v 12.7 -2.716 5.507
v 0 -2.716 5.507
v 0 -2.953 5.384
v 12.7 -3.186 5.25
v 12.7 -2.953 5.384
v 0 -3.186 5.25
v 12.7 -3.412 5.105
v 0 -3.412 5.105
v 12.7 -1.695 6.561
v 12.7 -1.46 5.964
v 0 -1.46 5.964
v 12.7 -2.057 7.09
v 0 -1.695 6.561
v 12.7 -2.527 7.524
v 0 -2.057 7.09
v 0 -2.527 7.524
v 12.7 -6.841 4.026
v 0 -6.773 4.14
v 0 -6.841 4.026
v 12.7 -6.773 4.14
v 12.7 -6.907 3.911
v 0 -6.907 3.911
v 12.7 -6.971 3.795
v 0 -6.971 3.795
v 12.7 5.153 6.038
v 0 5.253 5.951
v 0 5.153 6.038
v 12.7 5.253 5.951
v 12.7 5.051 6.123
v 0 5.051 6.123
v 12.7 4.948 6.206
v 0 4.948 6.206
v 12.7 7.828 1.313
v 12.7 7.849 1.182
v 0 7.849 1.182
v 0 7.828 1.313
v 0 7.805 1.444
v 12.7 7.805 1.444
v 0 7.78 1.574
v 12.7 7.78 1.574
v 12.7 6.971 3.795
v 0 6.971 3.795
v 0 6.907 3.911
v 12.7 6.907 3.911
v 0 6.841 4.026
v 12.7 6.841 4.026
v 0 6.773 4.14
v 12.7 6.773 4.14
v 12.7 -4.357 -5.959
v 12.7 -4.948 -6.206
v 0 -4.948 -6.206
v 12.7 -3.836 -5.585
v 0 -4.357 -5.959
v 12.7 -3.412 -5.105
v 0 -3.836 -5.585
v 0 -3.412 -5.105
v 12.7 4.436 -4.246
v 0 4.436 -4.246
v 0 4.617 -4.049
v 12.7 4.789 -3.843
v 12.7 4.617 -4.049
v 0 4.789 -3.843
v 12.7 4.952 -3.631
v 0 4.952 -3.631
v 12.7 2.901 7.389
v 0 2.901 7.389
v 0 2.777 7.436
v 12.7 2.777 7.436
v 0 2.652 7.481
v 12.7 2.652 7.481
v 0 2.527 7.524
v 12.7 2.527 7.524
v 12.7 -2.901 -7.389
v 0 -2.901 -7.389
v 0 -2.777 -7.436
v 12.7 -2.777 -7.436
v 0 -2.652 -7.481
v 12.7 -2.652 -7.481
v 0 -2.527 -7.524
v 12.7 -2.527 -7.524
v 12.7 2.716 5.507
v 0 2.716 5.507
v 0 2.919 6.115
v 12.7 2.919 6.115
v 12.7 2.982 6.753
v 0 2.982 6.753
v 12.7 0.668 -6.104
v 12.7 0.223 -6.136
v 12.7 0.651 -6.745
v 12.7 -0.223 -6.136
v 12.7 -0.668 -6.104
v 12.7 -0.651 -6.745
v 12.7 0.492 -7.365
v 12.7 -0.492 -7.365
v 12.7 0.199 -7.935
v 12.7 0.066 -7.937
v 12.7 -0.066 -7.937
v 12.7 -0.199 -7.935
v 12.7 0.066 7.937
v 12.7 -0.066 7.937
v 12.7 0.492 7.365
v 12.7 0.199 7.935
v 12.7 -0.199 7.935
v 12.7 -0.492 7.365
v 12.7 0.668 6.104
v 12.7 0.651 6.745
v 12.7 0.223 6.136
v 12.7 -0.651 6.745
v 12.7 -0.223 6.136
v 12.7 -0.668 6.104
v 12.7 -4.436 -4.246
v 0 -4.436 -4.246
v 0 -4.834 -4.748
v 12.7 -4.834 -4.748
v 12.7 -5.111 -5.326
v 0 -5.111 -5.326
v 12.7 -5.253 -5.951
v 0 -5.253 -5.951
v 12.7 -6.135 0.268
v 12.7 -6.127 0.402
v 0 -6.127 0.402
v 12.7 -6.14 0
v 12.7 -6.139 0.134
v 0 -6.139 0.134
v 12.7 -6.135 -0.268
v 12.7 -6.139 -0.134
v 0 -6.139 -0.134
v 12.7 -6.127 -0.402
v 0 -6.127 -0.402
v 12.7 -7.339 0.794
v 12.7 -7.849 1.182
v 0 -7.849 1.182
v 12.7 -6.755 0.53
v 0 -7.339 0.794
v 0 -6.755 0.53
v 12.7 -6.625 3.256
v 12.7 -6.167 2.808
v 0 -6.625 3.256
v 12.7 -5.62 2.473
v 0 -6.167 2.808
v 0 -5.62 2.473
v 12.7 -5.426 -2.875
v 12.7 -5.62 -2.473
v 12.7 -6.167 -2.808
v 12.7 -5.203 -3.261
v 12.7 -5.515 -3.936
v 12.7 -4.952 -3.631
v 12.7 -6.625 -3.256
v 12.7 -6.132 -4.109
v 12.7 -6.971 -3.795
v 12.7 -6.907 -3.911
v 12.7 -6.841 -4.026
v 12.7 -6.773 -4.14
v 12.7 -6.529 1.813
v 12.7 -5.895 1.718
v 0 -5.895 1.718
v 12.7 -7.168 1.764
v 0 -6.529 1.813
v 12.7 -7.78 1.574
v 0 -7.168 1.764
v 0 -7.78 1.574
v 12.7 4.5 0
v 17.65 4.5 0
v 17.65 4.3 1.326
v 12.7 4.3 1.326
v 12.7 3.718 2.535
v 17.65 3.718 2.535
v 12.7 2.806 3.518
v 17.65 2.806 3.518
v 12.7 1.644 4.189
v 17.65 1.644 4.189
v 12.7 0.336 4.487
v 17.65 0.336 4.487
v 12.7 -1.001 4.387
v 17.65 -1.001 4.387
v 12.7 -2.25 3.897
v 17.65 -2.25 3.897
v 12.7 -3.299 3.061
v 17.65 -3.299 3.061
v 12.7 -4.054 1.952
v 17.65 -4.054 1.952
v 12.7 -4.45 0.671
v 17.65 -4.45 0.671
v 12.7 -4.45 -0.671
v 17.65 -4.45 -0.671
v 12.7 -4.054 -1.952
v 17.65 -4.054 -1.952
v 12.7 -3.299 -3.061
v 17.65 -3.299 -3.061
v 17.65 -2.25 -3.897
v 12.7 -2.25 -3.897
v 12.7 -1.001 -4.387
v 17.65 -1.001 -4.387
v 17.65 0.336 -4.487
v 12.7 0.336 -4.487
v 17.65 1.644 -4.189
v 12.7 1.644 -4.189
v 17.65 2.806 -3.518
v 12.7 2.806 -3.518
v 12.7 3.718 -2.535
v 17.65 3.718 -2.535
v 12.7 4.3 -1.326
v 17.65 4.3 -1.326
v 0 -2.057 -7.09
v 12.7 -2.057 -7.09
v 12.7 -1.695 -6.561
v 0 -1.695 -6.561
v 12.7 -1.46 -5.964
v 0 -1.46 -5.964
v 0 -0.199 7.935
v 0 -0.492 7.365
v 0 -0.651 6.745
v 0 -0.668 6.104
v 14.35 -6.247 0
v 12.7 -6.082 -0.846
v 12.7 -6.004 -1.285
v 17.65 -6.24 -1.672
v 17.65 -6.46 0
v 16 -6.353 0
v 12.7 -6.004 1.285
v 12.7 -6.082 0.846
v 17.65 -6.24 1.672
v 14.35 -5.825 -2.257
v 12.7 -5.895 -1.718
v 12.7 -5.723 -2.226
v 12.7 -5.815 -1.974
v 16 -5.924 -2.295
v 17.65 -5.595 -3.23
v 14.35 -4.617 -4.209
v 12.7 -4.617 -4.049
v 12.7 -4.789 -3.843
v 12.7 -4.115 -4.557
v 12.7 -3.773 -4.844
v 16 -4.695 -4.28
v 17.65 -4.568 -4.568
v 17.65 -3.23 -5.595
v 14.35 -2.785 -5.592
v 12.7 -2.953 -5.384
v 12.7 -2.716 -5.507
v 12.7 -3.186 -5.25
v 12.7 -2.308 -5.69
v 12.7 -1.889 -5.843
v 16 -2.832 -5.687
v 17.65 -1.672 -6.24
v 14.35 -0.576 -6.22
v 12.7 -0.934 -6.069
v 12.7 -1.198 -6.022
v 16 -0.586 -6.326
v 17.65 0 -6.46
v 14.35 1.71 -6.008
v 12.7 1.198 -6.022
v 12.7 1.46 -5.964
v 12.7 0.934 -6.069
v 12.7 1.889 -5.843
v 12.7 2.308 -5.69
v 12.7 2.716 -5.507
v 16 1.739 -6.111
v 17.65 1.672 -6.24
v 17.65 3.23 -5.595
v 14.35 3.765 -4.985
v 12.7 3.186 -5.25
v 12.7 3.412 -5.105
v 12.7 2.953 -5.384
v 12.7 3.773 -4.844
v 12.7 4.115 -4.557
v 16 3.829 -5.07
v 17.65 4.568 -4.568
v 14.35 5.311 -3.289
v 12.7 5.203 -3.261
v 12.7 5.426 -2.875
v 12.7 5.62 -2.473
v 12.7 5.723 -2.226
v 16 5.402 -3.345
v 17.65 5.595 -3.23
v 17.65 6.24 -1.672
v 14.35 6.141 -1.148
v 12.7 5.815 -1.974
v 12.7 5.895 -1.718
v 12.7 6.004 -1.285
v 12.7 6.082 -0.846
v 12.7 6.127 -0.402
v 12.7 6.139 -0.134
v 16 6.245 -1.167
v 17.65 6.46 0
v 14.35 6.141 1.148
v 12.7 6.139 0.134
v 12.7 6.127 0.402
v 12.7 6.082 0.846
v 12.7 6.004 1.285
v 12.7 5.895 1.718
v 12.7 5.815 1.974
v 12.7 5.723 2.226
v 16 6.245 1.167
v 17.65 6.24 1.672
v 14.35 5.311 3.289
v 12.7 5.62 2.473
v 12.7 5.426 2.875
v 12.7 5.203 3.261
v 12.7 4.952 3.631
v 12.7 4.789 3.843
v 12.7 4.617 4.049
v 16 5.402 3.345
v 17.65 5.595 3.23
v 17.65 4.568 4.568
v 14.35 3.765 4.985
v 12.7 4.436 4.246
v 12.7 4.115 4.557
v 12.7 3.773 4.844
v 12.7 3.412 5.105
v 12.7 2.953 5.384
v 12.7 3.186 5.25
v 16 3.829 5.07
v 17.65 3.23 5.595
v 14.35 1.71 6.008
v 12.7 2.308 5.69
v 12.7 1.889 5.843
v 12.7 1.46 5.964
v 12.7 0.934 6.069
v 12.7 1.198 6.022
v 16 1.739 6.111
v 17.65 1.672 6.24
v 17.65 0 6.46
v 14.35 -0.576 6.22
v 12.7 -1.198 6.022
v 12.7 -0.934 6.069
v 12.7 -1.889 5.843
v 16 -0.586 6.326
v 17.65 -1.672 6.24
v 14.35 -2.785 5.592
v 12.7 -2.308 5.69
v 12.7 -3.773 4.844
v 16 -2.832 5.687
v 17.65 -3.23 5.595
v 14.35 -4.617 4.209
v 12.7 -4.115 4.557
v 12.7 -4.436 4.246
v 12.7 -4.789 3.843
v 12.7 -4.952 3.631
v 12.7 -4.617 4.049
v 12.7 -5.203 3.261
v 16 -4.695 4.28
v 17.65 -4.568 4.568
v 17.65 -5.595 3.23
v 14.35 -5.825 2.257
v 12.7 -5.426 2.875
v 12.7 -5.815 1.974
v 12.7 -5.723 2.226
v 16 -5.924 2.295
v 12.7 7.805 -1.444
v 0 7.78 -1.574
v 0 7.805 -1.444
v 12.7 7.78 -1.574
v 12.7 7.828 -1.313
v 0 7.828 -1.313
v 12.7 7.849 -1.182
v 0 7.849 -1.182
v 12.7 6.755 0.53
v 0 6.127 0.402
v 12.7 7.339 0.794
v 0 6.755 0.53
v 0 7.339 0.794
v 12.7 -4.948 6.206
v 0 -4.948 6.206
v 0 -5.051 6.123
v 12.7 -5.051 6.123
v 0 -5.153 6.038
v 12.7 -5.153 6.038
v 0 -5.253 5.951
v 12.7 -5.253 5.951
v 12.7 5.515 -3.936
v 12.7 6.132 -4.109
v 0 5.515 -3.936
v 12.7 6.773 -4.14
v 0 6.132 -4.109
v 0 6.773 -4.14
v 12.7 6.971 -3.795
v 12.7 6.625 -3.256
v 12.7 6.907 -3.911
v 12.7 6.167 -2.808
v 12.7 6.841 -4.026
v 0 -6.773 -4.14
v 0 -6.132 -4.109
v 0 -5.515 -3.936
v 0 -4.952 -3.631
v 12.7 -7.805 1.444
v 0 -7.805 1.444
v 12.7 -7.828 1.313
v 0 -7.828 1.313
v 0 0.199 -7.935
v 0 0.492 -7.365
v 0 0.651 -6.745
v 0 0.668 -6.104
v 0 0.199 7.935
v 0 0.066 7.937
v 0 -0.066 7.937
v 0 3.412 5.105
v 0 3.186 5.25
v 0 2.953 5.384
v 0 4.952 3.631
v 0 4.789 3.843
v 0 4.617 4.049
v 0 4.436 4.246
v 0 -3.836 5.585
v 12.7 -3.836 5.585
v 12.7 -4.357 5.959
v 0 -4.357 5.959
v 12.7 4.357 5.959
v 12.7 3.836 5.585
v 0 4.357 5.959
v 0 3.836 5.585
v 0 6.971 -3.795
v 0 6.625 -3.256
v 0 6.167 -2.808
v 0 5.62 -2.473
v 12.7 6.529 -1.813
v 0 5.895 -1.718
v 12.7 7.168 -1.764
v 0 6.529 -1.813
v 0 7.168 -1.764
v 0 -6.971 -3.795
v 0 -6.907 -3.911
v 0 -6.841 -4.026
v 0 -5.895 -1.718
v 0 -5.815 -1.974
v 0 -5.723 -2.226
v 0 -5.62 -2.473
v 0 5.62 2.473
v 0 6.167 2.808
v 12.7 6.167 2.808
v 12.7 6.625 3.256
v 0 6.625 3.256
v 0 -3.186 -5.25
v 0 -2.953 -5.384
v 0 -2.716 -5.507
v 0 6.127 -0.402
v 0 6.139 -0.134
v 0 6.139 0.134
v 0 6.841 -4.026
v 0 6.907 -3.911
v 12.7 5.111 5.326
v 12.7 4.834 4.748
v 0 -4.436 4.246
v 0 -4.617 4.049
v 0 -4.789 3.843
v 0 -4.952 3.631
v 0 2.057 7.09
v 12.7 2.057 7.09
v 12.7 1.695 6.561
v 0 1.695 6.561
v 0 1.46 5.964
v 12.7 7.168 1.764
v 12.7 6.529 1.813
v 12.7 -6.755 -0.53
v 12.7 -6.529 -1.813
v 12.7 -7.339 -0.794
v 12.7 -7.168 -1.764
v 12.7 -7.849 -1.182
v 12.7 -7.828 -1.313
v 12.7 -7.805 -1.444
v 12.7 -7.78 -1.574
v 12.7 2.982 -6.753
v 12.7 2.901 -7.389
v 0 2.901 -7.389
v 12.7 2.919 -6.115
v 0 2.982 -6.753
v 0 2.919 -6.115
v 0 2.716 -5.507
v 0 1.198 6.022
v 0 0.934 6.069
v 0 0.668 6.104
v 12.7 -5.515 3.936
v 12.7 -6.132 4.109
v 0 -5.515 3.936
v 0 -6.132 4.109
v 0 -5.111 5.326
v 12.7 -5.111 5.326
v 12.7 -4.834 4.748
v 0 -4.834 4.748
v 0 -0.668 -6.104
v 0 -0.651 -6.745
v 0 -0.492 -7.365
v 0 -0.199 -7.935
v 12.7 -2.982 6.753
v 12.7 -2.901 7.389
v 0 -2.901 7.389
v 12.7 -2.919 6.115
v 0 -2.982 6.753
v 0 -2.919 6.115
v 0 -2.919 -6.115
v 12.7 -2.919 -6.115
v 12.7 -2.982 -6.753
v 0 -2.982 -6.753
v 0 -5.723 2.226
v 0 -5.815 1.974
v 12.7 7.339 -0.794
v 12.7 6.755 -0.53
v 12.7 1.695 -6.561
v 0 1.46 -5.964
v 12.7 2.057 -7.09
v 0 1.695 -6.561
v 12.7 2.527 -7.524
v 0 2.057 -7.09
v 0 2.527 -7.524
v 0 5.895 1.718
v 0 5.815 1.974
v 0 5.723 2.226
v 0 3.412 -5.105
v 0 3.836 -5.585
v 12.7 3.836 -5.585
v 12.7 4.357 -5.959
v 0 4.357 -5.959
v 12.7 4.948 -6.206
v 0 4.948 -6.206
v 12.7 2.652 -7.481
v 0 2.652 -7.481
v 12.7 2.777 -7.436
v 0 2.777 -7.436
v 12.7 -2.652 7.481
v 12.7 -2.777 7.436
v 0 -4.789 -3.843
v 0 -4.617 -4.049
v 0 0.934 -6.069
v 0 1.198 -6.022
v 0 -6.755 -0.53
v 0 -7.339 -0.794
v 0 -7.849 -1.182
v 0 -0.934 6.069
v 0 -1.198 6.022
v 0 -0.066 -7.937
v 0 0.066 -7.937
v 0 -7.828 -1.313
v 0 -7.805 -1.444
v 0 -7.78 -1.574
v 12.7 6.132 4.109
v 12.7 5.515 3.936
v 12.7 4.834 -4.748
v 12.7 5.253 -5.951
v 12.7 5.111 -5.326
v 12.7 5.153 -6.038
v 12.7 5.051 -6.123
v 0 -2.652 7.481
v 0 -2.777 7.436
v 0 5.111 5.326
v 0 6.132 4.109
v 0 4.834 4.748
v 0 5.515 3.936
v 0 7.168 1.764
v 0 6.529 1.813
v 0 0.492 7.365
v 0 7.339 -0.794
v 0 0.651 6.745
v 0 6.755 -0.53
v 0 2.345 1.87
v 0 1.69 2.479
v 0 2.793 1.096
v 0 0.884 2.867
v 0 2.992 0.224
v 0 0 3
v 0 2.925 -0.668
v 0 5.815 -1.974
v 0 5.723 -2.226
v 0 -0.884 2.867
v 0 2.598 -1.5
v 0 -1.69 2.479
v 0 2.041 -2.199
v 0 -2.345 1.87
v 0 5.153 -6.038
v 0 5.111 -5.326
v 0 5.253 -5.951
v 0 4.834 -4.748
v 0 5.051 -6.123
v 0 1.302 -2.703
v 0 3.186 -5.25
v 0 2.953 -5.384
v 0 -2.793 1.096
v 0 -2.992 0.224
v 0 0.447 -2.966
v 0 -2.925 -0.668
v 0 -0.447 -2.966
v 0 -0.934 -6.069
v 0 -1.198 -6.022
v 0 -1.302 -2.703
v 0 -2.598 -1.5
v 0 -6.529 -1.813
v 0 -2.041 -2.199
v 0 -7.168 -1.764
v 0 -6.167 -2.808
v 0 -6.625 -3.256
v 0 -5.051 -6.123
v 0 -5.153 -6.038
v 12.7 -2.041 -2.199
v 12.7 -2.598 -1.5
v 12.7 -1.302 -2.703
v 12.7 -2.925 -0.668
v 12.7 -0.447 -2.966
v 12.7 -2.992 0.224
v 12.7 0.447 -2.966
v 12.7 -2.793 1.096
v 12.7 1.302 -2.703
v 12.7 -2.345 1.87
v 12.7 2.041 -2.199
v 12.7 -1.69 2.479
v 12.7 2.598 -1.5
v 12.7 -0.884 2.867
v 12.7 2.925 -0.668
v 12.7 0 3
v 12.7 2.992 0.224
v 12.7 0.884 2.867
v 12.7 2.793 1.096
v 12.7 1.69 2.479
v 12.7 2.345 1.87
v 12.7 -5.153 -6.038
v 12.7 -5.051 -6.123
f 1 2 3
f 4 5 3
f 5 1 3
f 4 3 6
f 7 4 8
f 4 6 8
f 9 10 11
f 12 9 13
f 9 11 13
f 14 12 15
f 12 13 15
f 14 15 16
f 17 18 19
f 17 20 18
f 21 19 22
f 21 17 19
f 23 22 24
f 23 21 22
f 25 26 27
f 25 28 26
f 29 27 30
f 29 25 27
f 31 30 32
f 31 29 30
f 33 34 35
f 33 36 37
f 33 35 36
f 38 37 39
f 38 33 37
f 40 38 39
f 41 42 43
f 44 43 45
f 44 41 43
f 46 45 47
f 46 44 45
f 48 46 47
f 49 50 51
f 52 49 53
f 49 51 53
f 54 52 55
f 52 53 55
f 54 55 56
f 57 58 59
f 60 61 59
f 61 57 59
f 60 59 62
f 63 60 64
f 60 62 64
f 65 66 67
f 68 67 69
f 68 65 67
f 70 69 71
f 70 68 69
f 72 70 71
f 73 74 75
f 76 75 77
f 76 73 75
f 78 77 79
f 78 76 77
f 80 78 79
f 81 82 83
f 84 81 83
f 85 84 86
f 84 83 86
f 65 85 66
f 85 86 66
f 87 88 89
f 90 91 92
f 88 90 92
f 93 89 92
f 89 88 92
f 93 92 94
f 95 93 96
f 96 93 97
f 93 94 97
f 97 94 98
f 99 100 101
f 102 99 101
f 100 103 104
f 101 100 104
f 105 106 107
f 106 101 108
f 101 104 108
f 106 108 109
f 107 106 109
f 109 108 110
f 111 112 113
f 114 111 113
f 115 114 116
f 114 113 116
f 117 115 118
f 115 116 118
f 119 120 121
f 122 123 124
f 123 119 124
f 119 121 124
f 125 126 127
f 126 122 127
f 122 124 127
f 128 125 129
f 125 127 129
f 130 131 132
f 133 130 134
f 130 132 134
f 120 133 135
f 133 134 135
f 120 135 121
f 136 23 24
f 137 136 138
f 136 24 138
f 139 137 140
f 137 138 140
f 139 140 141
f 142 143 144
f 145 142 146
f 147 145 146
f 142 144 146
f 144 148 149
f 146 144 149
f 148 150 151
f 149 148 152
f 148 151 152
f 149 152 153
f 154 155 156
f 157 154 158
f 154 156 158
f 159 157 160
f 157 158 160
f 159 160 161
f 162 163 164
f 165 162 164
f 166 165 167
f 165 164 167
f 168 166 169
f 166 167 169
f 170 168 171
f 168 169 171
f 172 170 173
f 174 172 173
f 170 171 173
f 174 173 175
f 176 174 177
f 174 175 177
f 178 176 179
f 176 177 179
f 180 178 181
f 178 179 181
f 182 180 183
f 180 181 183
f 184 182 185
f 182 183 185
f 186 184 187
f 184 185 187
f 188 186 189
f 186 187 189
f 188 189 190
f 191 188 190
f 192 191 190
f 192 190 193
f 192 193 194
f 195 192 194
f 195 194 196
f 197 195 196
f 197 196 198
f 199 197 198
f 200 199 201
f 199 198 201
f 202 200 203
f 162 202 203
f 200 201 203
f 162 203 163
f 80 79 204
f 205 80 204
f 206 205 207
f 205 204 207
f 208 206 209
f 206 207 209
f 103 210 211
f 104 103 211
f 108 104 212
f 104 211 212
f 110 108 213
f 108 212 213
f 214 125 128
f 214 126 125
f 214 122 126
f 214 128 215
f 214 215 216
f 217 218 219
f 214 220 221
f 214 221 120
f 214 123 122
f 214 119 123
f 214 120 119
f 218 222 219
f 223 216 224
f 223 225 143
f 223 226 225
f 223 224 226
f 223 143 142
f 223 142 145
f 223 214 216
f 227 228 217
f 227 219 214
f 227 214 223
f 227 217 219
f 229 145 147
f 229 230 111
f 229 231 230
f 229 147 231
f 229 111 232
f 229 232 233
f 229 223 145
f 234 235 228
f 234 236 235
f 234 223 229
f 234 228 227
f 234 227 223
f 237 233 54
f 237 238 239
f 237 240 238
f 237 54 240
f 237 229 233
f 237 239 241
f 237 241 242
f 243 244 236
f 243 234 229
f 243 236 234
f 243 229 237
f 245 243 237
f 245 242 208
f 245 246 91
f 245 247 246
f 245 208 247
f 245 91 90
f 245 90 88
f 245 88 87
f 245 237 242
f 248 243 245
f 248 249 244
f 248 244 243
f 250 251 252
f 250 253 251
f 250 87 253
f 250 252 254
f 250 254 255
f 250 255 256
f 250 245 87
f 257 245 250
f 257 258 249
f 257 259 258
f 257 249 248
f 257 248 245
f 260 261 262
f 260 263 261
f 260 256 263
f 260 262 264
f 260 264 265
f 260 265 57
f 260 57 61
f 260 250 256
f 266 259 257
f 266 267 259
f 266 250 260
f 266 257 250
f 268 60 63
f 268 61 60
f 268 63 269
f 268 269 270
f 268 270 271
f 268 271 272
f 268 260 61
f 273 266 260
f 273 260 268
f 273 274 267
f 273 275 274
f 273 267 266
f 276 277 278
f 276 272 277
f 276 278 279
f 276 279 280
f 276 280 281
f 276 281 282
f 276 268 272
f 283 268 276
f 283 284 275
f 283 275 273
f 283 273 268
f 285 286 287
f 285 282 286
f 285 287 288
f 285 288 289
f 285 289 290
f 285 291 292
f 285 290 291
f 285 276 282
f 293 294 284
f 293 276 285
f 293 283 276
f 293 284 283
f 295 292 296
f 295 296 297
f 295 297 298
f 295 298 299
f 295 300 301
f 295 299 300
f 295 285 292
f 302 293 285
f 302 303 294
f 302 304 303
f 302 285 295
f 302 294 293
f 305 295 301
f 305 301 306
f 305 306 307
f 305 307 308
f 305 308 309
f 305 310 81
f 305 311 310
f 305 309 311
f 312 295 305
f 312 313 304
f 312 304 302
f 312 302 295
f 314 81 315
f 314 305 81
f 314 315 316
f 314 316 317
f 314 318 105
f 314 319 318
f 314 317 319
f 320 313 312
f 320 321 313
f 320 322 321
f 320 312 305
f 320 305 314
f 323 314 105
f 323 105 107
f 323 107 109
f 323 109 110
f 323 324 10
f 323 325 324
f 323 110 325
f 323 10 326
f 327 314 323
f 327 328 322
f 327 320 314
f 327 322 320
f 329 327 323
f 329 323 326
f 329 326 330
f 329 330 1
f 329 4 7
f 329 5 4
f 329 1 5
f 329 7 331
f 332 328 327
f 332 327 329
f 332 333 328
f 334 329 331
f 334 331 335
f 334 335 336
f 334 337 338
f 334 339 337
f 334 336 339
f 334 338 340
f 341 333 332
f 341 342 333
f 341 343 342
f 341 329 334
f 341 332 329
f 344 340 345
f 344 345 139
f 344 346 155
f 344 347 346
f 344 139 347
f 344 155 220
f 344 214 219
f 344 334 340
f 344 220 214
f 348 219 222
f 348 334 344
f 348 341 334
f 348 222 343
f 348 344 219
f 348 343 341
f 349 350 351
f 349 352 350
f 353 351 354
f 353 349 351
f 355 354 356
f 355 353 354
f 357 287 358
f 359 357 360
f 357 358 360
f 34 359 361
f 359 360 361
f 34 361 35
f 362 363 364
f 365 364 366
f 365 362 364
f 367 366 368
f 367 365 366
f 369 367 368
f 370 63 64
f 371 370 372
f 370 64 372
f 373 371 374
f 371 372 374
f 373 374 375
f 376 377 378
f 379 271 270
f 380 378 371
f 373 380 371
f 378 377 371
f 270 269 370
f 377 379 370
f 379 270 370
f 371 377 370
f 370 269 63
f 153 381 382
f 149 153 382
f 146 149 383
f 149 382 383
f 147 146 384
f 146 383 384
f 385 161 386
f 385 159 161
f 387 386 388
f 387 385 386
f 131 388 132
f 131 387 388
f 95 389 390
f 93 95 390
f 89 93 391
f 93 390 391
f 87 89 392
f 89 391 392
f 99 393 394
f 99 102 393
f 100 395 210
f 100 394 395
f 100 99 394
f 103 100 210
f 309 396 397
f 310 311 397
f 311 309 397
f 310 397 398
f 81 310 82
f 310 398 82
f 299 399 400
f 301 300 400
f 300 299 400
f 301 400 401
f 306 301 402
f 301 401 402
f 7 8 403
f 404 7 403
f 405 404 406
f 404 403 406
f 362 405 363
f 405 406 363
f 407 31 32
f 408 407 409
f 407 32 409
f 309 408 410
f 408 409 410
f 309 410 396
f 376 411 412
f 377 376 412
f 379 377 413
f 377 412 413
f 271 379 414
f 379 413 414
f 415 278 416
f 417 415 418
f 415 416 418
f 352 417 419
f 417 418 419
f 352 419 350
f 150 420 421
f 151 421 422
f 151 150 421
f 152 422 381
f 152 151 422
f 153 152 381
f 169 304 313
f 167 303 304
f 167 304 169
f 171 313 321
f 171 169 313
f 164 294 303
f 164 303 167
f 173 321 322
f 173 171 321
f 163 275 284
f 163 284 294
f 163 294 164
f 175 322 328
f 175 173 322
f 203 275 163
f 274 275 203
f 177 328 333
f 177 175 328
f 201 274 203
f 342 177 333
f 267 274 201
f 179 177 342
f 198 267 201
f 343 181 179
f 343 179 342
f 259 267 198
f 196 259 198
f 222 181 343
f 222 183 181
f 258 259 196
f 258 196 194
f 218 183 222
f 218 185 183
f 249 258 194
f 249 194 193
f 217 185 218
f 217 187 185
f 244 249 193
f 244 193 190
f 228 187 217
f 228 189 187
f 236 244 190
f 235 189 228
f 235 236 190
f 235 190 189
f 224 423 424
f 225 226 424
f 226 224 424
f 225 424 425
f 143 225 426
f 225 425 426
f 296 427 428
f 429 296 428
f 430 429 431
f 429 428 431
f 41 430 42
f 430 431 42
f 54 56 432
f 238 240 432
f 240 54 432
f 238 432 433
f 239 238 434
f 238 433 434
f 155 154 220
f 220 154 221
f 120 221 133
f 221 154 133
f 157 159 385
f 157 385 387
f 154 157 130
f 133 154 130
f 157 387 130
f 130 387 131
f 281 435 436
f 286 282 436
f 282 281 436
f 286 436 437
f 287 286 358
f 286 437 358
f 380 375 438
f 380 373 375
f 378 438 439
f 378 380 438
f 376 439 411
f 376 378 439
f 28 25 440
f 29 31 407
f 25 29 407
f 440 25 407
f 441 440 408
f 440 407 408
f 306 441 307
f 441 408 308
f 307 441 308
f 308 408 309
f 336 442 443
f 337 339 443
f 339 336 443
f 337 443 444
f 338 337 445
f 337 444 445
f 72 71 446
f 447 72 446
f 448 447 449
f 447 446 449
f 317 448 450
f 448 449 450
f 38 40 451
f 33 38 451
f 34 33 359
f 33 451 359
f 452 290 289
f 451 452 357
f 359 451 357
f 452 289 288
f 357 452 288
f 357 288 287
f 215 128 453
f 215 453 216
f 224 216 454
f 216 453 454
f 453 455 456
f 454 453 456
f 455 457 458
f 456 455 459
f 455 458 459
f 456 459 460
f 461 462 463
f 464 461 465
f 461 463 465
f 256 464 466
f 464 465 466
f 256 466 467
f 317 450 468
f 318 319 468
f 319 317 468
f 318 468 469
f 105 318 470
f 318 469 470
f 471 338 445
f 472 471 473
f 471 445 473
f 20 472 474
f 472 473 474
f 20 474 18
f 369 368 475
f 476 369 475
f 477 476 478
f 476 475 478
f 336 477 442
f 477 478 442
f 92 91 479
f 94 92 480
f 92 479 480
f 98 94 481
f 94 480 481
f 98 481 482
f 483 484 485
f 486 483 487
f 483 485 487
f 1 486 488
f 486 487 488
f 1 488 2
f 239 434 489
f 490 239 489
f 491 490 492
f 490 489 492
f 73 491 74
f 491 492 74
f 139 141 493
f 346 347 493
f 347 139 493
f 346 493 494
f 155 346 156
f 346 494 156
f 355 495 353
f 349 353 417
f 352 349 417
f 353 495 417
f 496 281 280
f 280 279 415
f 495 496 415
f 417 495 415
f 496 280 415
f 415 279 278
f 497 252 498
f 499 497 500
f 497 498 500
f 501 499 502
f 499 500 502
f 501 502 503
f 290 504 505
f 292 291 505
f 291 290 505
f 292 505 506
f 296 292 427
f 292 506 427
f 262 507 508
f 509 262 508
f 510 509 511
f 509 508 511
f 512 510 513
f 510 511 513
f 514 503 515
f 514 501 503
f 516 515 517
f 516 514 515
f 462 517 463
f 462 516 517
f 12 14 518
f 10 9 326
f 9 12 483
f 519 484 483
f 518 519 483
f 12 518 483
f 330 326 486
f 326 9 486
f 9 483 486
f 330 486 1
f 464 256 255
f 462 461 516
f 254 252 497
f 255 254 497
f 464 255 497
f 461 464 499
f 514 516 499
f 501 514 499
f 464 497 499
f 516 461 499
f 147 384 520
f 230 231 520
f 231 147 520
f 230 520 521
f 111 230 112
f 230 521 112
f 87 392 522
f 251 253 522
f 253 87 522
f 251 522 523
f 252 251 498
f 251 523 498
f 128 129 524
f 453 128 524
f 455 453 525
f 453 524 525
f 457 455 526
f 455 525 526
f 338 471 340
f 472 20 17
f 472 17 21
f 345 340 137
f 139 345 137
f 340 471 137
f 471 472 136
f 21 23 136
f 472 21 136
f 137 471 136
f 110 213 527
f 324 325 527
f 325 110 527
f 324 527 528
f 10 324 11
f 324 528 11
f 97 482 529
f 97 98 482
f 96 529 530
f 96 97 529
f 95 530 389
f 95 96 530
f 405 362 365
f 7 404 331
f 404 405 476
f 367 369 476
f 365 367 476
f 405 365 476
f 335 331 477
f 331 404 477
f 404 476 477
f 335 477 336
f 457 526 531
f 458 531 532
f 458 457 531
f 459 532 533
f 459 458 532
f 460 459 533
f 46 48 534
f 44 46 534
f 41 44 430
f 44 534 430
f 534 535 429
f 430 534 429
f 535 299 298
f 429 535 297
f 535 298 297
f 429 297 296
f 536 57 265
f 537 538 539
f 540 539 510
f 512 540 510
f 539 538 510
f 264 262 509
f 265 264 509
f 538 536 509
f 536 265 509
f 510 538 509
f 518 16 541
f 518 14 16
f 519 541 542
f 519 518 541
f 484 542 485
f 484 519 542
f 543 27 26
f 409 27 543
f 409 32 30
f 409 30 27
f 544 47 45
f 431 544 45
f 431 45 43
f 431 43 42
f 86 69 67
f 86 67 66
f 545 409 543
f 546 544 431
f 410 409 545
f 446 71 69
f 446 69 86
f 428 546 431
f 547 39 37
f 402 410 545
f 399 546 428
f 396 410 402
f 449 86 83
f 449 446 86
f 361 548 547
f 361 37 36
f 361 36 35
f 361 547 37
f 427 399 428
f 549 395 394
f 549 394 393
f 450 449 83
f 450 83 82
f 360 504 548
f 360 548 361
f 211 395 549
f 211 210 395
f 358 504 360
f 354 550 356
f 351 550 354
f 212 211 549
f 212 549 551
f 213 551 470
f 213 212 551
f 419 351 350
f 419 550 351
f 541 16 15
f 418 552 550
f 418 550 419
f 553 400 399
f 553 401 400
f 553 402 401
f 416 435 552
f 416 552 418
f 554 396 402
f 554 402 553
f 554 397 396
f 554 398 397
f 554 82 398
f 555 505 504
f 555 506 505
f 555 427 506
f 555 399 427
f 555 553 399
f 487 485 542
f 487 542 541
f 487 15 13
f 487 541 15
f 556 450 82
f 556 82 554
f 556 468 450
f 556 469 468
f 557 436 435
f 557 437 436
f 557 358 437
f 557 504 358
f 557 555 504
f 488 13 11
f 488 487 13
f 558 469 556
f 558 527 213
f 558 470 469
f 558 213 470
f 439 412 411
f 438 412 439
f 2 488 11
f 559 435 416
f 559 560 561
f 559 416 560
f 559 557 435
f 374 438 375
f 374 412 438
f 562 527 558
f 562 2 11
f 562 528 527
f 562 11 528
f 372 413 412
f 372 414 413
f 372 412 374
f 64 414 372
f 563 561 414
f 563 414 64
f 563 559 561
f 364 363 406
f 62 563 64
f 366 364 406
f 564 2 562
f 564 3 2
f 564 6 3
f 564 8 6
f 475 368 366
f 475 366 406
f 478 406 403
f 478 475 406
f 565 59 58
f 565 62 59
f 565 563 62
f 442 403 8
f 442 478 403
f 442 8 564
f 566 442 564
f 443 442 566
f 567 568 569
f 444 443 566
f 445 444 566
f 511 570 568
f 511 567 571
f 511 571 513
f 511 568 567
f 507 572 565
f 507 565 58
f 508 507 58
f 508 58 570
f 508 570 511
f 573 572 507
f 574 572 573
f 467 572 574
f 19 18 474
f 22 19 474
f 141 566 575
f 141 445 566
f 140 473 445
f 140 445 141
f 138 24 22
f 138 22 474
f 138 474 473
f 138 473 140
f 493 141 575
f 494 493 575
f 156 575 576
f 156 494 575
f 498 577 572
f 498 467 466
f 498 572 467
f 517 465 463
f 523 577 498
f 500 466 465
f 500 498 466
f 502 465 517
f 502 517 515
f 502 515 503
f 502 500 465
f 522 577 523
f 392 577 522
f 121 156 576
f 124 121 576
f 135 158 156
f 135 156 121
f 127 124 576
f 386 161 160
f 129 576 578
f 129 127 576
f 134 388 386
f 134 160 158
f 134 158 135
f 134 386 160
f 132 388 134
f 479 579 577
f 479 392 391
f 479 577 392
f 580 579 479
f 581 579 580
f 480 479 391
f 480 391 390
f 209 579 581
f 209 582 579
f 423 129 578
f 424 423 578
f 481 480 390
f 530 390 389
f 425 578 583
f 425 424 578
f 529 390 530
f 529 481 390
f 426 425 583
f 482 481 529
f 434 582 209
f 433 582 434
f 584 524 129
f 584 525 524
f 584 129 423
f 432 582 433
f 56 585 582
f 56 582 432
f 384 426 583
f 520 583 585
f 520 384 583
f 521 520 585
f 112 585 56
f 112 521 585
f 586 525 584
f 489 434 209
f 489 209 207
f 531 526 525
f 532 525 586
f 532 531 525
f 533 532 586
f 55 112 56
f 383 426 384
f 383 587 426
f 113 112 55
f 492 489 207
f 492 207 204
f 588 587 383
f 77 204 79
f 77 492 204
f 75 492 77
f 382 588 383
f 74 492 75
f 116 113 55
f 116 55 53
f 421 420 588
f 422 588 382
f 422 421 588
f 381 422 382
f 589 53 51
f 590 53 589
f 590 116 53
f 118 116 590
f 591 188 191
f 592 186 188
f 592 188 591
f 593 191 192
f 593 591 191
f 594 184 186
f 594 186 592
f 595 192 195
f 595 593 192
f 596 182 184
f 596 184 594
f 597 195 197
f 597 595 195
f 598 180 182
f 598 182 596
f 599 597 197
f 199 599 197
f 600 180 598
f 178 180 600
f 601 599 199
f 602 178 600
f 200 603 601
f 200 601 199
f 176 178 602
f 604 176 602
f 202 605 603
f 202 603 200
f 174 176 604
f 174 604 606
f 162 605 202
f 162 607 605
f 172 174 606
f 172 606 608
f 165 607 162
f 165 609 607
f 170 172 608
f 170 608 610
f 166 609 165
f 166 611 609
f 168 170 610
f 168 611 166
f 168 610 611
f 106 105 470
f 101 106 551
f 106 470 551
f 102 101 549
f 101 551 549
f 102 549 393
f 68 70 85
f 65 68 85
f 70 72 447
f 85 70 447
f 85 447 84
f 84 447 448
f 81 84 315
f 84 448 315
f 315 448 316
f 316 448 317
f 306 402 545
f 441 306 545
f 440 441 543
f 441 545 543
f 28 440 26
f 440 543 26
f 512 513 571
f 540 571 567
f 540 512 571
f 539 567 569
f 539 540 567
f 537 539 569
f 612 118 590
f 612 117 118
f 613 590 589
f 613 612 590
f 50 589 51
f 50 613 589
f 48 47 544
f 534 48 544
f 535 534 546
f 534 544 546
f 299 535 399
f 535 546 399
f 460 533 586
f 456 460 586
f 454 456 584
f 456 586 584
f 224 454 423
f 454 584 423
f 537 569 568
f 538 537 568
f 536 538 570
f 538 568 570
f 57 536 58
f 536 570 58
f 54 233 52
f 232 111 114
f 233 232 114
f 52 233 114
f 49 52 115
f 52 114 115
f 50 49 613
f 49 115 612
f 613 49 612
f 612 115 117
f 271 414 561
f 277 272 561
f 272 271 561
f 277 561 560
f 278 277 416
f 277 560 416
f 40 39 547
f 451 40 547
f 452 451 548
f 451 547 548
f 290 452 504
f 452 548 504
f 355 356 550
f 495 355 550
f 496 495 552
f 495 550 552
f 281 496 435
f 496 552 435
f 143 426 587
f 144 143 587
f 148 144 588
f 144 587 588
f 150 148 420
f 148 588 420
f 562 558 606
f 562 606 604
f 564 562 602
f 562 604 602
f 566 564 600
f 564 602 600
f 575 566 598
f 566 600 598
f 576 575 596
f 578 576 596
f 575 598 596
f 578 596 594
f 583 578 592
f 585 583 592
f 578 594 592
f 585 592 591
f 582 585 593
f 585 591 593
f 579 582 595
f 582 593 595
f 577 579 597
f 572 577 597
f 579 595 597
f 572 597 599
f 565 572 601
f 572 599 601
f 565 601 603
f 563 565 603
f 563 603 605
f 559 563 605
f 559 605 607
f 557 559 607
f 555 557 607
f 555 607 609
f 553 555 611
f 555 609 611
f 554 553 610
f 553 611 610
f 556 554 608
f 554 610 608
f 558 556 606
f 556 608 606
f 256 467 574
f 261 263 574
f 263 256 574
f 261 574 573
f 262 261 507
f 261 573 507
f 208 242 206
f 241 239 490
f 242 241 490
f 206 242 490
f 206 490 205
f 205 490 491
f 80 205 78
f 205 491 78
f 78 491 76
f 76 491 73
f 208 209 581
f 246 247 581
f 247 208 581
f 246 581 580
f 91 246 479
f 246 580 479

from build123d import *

# Parameters (mm, degrees)
BASPROSKE_W        = 12.7
BASPROSKE_H        = 7.9375
TOOTHCUT_DEPTH     = 17.949861725
TEETHCUTS_COUNT    = 18
TEETHCUTS_ANGLE    = 340
BORSKE_R           = 3
BORE_DEPTH         = 50.8000508
SKETCH2_R          = 4.5
CUT_EXTRUDE1_DEPTH = 4.95


with BuildPart() as part:
    # BasProSke → Base-Revolve (revolve)
    with BuildSketch(Plane(origin=(0, 0, 0), x_dir=(1, 0, 0), z_dir=(0, 1, 0)), mode=Mode.PRIVATE) as base_revolve_sk:
        with Locations((6.35, 3.96875)):
            Rectangle(BASPROSKE_W, BASPROSKE_H)
    revolve(base_revolve_sk.sketch.rotate(Axis((-10, 0, 0), (1, 0, 0)), 180), axis=Axis((-10, 0, 0), (1, 0, 0)))

    # TooCutSke → ToothCut (cut, through all)
    with BuildSketch(Plane(origin=(0, 0, 0), x_dir=(0, 0, -1), z_dir=(1, 0, 0))):
        with BuildLine():
            ThreePointArc((0.401805019, 6.127289689), (0, 6.14045), (-0.401805019, 6.127289689))
            ThreePointArc((-0.401805019, 6.127289689), (-0.651999955, 7.068698885), (-1.203877601, 7.87136933))
            ThreePointArc((-1.203877601, 7.87136933), (0, 7.9629), (1.203877601, 7.87136933))
            ThreePointArc((1.203877601, 7.87136933), (0.651999955, 7.068698885), (0.401805019, 6.127289689))
        make_face()
    toothcut = extrude(amount=TOOTHCUT_DEPTH, mode=Mode.SUBTRACT)

    # TeethCuts: ToothCut ×18 about axis
    teethcuts_axis = Axis((-10, 0, 0), (1, 0, 0))
    for i in range(1, TEETHCUTS_COUNT):
        add(toothcut.rotate(teethcuts_axis, i * TEETHCUTS_ANGLE / (TEETHCUTS_COUNT - 1)), mode=Mode.SUBTRACT)

    # BorSke → Bore (cut, symmetric)
    with BuildSketch(Plane(origin=(0, 0, 0), x_dir=(0, 0, -1), z_dir=(1, 0, 0))):
        with Locations(Location((0, 0, 0), (0, 0, 180))):
            Circle(BORSKE_R)
    extrude(amount=BORE_DEPTH, both=True, mode=Mode.SUBTRACT)

    # Sketch1 → Revolve1 (revolve)
    with BuildSketch(Plane.XY, mode=Mode.PRIVATE) as revolve1_sk:
        Polygon((12.7, 6.14045), (17.65, 6.46), (17.65, 4.46), (12.7, 4.46), align=None)
    revolve(revolve1_sk.sketch.rotate(Axis((12.7, 0, 0), (1, 0, 0)), 180), axis=Axis((12.7, 0, 0), (1, 0, 0)))

    # Sketch2 → Cut-Extrude1 (cut)
    with BuildSketch(Plane(origin=(17.65, 0, 0), x_dir=(0, 0, -1), z_dir=(1, 0, 0))):
        with Locations(Location((0, 0, 0), (0, 0, 90))):
            Circle(SKETCH2_R)
    extrude(amount=-CUT_EXTRUDE1_DEPTH, mode=Mode.SUBTRACT)


solid = part.part
